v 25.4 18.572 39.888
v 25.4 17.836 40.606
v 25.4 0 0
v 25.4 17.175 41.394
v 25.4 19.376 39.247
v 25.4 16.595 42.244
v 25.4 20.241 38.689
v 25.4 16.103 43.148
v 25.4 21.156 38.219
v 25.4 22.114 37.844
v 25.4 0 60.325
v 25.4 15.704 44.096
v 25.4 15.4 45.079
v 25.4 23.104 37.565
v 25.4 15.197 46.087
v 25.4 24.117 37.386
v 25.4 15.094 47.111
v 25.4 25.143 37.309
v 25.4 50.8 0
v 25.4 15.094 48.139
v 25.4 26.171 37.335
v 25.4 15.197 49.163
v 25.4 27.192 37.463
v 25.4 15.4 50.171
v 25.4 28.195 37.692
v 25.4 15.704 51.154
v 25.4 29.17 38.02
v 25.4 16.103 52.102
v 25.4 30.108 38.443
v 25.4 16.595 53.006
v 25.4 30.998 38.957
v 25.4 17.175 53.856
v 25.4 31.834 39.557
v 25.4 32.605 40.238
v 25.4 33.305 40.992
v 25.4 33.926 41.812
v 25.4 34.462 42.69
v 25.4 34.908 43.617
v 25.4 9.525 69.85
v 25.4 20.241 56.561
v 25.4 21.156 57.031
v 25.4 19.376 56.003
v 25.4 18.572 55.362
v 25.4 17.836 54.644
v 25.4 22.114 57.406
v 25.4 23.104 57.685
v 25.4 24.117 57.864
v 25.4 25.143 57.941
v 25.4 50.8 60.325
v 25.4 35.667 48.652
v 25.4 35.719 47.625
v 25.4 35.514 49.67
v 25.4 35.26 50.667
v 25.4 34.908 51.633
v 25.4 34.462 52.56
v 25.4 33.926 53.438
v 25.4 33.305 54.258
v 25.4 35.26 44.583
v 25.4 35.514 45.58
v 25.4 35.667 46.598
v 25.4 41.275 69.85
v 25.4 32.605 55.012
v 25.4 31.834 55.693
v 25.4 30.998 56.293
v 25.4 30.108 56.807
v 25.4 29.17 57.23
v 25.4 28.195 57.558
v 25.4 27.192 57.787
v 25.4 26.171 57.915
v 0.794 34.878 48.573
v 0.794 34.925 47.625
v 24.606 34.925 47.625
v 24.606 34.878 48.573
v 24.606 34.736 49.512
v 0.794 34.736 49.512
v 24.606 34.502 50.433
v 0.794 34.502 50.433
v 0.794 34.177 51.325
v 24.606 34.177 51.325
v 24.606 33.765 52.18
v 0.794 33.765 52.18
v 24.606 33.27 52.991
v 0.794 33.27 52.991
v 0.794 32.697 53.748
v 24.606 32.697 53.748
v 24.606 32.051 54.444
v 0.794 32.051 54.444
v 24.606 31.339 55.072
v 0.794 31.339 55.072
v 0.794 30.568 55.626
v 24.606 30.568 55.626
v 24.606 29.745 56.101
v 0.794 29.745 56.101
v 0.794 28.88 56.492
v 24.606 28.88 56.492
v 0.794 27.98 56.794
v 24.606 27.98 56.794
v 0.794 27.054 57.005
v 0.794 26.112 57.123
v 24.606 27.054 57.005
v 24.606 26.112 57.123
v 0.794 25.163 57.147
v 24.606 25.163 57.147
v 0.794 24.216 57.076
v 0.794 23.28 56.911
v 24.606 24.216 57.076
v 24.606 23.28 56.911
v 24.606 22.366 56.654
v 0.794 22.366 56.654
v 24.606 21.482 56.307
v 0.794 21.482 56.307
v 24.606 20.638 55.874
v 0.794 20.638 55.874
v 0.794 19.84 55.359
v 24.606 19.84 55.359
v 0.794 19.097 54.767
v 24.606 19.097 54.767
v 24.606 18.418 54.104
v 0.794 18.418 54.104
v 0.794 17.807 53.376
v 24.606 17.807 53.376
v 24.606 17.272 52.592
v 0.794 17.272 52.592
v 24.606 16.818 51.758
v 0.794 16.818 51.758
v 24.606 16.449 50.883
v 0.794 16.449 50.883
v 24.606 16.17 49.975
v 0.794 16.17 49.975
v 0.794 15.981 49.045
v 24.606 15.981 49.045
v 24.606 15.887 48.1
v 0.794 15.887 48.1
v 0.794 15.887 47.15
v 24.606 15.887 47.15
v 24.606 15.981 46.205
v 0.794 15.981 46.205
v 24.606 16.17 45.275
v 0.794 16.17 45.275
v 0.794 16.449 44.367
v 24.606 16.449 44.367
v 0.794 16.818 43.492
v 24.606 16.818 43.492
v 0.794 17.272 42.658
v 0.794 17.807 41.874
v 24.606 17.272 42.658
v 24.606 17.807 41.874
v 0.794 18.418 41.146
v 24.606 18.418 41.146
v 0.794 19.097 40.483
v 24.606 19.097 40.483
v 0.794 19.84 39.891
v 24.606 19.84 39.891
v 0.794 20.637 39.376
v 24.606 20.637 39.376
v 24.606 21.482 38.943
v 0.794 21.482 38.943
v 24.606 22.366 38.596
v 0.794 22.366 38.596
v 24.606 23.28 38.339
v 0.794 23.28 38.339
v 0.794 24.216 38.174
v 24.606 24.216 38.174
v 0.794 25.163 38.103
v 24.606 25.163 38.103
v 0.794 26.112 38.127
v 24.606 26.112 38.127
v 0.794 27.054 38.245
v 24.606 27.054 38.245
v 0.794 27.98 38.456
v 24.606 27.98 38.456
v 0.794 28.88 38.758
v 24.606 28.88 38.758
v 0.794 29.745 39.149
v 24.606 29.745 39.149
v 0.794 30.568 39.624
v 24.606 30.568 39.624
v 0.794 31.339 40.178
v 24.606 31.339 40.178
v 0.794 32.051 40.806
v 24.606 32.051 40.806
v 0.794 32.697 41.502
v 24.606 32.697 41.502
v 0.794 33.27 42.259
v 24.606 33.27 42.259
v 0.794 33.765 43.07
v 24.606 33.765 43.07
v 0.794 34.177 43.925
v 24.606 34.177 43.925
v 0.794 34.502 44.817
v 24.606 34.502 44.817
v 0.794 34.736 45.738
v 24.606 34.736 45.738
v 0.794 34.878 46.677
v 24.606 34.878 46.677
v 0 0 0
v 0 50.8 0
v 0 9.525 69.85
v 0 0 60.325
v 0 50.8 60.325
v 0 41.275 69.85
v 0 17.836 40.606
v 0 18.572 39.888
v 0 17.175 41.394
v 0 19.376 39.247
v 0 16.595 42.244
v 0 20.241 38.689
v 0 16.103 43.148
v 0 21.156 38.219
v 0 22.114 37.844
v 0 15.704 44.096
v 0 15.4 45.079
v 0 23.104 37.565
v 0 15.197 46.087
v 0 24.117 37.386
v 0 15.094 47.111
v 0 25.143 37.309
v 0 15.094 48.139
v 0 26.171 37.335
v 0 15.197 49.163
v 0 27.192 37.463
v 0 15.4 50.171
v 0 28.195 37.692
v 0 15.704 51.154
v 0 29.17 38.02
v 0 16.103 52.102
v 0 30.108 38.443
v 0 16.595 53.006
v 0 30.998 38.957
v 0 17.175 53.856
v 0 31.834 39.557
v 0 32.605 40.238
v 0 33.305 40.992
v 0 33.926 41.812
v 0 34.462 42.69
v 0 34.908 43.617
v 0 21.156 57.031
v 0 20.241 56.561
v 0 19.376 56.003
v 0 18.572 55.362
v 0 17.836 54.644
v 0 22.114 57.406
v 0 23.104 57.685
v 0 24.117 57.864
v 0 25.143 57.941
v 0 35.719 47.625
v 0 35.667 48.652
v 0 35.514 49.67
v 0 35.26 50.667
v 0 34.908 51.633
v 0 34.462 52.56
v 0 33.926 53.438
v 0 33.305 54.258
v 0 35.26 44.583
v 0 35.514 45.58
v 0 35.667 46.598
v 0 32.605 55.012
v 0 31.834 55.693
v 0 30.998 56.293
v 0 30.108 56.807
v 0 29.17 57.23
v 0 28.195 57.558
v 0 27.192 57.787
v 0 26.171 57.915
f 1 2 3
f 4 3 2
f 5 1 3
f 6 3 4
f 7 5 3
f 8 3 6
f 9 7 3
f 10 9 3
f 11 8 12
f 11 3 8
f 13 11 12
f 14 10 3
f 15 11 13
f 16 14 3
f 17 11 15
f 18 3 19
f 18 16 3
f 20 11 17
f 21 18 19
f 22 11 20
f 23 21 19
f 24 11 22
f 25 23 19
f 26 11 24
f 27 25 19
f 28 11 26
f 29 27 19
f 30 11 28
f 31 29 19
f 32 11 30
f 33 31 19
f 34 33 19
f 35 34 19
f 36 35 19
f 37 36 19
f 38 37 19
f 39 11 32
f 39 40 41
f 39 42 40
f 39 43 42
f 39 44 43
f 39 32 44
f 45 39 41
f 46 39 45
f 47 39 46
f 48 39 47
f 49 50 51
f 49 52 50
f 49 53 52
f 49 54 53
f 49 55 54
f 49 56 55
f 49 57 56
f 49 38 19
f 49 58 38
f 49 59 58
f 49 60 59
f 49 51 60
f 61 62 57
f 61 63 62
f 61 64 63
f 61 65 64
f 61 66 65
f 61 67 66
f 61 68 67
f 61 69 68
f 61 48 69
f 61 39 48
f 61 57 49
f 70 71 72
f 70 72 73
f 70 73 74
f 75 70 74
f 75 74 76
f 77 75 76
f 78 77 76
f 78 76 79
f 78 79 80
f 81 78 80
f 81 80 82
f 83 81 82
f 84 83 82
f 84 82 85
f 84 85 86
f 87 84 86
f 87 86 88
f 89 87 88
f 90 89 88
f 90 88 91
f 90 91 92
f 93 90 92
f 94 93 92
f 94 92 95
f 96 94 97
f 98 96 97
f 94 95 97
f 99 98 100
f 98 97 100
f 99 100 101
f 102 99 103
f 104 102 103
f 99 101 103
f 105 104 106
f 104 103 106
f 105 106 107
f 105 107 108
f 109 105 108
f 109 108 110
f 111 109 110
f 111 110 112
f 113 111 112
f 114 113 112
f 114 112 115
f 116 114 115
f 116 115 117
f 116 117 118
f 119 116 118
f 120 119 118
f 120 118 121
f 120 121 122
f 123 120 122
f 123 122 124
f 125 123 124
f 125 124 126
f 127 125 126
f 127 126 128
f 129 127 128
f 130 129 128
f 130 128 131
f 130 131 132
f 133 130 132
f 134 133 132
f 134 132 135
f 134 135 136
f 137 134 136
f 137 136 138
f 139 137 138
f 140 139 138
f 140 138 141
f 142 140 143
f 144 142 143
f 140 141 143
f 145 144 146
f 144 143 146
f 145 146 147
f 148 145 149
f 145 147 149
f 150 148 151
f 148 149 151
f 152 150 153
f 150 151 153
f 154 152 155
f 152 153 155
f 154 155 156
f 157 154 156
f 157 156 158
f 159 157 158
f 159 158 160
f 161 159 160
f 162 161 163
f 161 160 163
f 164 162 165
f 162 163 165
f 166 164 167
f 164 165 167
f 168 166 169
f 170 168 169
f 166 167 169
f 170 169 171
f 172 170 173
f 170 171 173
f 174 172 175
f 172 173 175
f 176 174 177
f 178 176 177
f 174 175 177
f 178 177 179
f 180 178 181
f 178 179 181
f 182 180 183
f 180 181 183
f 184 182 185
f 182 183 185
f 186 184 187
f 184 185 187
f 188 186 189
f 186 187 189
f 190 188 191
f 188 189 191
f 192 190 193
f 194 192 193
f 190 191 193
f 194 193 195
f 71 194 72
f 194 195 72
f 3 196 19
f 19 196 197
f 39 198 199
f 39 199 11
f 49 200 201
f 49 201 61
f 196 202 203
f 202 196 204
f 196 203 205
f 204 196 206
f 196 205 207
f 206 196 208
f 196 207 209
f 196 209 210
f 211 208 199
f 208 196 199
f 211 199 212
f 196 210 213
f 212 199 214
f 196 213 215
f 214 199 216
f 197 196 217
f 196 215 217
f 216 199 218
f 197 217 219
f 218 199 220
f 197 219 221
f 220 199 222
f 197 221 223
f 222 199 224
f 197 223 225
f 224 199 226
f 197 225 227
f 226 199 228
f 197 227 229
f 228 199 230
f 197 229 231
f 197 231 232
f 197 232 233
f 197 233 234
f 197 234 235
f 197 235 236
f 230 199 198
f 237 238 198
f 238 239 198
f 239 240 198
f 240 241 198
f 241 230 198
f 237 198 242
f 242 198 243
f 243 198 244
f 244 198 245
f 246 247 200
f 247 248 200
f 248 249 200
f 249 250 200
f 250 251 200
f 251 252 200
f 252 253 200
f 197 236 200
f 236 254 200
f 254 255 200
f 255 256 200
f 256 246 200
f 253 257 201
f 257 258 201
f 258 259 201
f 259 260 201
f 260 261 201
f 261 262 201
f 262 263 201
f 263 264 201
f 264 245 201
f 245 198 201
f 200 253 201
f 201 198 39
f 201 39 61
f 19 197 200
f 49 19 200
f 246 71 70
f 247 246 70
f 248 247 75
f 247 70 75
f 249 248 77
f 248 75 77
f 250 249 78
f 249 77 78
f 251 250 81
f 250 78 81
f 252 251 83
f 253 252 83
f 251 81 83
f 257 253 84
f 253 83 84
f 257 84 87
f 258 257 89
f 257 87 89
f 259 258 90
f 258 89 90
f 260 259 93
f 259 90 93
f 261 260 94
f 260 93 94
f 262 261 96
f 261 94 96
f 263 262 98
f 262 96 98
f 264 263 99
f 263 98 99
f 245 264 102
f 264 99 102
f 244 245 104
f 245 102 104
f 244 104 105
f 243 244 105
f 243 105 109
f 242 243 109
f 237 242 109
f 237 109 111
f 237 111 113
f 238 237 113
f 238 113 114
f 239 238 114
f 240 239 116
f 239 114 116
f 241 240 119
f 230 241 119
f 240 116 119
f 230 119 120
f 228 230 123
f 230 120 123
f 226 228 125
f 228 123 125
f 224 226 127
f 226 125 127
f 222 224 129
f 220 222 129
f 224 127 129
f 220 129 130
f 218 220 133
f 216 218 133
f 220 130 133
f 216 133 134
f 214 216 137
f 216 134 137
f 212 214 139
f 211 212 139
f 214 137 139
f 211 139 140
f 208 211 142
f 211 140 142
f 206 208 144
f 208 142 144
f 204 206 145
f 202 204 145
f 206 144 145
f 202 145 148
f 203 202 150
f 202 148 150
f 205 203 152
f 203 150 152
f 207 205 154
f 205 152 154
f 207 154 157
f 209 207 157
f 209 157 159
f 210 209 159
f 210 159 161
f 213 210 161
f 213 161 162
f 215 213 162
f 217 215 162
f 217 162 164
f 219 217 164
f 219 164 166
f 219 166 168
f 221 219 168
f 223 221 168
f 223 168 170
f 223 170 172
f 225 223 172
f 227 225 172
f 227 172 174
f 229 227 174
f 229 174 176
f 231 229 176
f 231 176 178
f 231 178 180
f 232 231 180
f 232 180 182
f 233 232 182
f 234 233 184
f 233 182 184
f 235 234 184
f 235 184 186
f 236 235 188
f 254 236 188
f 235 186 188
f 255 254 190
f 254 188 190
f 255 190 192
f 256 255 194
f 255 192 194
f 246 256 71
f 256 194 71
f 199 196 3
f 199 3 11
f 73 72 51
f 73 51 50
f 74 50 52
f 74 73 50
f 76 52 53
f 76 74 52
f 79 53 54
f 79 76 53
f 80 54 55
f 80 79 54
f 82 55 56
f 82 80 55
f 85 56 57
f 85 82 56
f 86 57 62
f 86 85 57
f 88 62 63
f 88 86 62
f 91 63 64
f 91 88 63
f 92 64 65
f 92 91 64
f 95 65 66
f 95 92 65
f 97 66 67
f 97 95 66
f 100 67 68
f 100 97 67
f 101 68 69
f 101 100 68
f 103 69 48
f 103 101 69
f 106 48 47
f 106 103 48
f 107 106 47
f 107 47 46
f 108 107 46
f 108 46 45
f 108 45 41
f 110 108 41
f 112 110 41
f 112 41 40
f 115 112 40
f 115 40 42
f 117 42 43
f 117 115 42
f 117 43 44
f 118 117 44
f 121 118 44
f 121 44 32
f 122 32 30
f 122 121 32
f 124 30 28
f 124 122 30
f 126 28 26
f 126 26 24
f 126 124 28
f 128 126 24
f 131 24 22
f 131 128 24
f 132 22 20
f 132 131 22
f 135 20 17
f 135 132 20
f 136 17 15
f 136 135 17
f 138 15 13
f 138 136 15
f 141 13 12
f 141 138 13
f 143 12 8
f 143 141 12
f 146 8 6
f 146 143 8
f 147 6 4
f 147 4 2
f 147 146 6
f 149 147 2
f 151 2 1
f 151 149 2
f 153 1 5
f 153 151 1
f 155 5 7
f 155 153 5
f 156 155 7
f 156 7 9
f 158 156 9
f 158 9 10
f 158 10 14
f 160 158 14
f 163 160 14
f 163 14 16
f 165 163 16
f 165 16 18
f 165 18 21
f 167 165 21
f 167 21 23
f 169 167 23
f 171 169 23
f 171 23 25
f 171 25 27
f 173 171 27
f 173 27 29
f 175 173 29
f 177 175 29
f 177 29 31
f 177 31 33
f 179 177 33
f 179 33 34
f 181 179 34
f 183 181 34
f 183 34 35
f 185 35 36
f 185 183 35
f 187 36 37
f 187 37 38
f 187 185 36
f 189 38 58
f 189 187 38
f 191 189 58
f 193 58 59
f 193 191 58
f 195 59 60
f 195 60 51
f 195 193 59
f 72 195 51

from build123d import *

# Parameters (mm, degrees)
F0_W     = 50.8
F0_H     = 69.85
F1_DEPTH = 25.4
F2_R     = 9.525
F3_DEPTH = 25.401
F4_SIZE  = 9.525
F5_SIZE  = 0.79375


with BuildPart() as f1:
    # F0 (on Right) → F1 (new body)
    with BuildSketch(Plane.YZ):
        with Locations((25.4, 34.925)):
            Rectangle(F0_W, F0_H)
    extrude(amount=F1_DEPTH)

    # F2 (on face) → F3 (cut, through all)
    with BuildSketch(Plane.YZ.offset(25.4)):
        with Locations((25.4, 47.625)):
            Circle(F2_R)
    extrude(amount=-F3_DEPTH, mode=Mode.SUBTRACT)

    # F4
    f4_edges = [f1.edges().sort_by_distance(p)[0] for p in [
        (12.7, 50.8, 69.85),
        (12.7, 0, 69.85),
    ]]
    chamfer(f4_edges, length=F4_SIZE)

    # F5
    f5_edges = [f1.edges().sort_by_distance(p)[0] for p in [
        (0, 15.875, 47.625),
        (25.4, 15.875, 47.625),
    ]]
    chamfer(f5_edges, length=F5_SIZE)


solid = f1.part
